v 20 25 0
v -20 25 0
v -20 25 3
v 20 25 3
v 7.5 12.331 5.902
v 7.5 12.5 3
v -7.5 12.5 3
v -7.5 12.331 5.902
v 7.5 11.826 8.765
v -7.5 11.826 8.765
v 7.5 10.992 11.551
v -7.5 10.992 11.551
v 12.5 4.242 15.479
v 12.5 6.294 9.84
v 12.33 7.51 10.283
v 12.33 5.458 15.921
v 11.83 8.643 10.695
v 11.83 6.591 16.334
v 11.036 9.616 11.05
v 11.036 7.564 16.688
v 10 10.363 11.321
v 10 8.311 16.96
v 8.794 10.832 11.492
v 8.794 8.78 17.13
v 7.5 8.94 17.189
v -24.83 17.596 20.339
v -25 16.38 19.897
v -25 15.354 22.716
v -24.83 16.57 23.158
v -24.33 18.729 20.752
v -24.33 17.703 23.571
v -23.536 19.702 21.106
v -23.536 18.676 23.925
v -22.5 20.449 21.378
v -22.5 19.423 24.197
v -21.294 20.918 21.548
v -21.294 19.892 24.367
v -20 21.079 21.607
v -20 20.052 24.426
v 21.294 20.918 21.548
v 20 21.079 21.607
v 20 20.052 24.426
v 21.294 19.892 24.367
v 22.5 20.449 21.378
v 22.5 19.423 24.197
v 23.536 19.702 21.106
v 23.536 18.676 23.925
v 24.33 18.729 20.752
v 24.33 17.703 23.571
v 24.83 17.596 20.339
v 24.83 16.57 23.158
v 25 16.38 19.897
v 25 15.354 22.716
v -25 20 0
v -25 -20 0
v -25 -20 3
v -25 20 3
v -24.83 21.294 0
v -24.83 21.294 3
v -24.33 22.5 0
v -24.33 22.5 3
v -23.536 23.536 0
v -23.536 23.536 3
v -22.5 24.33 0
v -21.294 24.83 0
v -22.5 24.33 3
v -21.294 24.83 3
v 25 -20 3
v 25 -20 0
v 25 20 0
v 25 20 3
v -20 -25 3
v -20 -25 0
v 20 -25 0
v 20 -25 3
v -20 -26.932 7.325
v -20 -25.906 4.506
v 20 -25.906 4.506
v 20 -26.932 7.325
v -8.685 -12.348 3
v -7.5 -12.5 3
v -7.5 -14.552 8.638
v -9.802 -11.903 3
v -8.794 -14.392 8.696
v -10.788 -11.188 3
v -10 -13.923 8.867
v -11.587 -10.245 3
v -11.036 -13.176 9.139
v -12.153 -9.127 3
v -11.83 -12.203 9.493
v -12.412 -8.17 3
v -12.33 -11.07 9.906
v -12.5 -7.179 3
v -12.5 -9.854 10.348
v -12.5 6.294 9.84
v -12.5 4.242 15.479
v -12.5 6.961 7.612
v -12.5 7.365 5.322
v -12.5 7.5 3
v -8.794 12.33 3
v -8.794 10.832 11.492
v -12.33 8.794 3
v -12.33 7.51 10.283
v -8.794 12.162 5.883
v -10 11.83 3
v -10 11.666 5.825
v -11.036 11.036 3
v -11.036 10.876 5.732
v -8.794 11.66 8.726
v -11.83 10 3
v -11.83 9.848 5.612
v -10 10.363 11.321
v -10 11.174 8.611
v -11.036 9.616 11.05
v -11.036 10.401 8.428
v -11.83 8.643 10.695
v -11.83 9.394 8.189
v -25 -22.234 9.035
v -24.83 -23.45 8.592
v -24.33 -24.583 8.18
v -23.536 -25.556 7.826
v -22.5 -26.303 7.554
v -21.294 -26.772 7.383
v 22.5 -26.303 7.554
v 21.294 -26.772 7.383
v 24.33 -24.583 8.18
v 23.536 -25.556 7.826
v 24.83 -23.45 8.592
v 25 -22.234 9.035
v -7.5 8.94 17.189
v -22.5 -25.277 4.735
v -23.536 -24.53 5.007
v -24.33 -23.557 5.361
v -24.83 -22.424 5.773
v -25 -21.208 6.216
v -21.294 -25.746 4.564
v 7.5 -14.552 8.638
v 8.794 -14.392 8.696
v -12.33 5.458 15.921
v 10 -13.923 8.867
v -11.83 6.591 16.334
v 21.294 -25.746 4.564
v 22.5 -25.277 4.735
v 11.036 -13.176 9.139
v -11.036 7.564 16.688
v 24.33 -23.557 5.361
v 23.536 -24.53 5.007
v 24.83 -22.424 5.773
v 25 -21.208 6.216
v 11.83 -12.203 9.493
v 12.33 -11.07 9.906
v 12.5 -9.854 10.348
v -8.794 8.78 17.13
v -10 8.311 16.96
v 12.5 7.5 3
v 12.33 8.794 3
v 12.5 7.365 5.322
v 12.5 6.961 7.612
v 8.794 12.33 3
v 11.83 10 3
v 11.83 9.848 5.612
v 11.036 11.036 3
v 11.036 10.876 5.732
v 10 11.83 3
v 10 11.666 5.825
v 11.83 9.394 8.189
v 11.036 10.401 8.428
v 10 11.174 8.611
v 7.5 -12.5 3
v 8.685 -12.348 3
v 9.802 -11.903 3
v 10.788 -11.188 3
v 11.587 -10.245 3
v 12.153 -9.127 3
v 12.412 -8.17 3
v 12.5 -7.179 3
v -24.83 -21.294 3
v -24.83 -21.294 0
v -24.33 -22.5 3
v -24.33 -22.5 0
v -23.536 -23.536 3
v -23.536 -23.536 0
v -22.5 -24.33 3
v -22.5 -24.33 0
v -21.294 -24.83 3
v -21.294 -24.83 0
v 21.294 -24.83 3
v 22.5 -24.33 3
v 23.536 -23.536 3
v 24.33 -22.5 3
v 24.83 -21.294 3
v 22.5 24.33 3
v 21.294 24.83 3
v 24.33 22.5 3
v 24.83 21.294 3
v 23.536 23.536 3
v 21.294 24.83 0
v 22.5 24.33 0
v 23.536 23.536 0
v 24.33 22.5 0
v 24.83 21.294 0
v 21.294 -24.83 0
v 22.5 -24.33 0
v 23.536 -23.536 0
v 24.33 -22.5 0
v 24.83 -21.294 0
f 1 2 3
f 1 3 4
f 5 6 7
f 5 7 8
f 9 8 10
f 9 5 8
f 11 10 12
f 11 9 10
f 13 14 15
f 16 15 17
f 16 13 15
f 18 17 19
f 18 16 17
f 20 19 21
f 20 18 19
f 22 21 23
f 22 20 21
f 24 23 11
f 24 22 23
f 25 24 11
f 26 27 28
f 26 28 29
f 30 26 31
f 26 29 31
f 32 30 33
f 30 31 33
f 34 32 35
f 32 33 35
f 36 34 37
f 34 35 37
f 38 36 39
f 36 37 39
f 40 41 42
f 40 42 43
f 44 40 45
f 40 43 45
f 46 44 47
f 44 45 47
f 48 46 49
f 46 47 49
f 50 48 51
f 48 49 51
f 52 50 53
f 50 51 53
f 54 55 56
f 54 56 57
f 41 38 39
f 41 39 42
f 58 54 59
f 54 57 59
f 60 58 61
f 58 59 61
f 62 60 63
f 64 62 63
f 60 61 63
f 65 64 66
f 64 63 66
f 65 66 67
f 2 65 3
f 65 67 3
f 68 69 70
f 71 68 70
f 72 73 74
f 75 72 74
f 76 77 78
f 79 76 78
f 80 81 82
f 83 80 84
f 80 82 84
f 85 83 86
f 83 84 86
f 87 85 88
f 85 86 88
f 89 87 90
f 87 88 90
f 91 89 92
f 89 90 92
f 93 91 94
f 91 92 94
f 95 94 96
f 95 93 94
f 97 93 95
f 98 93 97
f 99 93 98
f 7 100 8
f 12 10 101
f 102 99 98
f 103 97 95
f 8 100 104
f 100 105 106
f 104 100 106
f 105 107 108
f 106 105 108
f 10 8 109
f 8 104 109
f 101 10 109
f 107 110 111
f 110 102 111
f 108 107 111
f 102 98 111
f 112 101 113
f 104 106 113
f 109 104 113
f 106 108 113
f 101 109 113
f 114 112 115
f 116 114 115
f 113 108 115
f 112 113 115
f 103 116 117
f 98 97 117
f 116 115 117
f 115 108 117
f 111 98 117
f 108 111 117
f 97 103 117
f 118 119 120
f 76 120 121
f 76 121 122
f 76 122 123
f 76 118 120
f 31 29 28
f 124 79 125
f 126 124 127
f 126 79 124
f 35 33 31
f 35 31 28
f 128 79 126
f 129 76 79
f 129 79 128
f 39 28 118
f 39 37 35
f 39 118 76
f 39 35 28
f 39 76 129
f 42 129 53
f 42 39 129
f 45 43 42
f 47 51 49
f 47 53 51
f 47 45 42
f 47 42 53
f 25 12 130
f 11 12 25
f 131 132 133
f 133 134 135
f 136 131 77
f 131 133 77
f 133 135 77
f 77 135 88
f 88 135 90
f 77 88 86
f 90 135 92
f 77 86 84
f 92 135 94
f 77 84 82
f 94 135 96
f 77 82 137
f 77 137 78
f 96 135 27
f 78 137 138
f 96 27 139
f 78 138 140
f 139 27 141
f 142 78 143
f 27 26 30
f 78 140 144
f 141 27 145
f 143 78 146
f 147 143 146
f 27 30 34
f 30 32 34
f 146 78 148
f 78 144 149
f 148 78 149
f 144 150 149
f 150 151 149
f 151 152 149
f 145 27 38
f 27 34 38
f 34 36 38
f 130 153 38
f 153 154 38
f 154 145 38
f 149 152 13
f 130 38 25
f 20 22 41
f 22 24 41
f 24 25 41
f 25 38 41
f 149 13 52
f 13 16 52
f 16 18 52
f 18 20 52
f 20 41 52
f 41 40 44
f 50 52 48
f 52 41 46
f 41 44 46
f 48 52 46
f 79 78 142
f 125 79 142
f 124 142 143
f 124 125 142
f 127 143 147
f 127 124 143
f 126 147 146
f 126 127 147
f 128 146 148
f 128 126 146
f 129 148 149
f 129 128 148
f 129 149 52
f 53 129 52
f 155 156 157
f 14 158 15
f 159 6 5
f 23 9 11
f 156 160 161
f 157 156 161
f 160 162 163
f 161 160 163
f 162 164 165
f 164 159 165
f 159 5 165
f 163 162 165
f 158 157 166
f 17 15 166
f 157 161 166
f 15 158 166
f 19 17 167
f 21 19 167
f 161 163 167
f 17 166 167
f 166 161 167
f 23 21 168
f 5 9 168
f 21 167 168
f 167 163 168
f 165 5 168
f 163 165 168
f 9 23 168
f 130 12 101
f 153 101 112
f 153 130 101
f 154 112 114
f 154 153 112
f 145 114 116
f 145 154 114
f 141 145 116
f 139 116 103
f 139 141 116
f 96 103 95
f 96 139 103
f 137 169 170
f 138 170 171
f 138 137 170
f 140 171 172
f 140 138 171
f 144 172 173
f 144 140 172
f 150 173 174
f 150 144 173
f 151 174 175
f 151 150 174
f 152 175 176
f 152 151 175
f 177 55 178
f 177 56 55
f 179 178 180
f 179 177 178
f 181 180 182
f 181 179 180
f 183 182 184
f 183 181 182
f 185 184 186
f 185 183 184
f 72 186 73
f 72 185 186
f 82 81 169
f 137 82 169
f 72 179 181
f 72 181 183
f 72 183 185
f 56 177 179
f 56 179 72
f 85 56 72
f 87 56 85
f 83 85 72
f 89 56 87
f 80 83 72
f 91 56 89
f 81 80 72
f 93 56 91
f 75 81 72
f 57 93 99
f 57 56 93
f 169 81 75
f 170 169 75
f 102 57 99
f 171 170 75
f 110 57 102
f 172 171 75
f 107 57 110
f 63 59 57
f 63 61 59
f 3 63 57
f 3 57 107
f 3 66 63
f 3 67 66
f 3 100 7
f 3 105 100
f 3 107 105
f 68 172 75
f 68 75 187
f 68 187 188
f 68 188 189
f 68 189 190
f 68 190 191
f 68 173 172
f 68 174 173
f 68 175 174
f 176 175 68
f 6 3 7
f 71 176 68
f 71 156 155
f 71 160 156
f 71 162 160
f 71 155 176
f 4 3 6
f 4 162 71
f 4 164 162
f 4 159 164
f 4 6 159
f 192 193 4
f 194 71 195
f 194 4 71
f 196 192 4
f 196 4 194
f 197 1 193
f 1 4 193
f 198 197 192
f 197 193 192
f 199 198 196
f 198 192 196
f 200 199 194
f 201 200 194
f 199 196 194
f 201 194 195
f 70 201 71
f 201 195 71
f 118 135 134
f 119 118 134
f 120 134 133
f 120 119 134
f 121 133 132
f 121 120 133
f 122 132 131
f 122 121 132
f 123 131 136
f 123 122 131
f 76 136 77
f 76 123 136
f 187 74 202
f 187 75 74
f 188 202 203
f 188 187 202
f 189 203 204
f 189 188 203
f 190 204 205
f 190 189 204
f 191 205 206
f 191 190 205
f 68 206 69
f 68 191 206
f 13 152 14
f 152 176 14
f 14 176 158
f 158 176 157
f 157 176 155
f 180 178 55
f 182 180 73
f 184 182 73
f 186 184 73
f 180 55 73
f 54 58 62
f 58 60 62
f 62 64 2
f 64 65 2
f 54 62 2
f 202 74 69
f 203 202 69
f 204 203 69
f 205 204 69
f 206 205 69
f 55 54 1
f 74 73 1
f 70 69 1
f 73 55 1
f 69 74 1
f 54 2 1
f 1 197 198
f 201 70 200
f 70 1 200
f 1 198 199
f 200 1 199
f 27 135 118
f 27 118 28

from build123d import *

# Parameters (mm, degrees)
F0_W     = 50
F0_H     = 50
F1_DEPTH = 3
F2_W     = 25
F2_H     = 25
F3_ANGLE = 20
F4_DEPTH = 6
F5_W     = 50
F5_H     = 50
F6_DEPTH = 3
F7_R     = 5
F8_R     = 5


with BuildPart() as f1:
    # F0 (on Top) → F1 (new body)
    with BuildSketch(Plane.XY):
        Rectangle(F0_W, F0_H)
    extrude(amount=F1_DEPTH)

    # F2 (on face) → F3 (revolve)
    with BuildSketch(Plane.XY.offset(3)):
        Rectangle(F2_W, F2_H)
    revolve(axis=Axis((0, -12.5, 3), (1, 0, 0)), revolution_arc=F3_ANGLE)

    # F4 (add): a face of the model
    f4_faces = [f1.faces().sort_by_distance(p)[0] for p in [
        (0, -0.7538422402, 7.2752517916),
    ]]
    extrude(f4_faces, amount=F4_DEPTH)

    # F5 (on face) → F6 (join)
    with BuildSketch(Plane(origin=(0, -4.478524505, 12.3046449499), x_dir=(1, 0, 0), z_dir=(0, -0.3420201433, 0.9396926208))):
        with Locations((0, 2.1972288873)):
            Rectangle(F5_W, F5_H)
    extrude(amount=F6_DEPTH)

    # F7
    f7_edges = [f1.edges().sort_by_distance(p)[0] for p in [
        (25, 20.565481, 23.016184),
        (-25, 20.565481, 23.016184),
        (-25, -26.41915, 5.915177),
        (25, -26.41915, 5.915177),
        (25, -25, 1.5),
        (-25, -25, 1.5),
        (-25, 25, 1.5),
        (25, 25, 1.5),
    ]]
    fillet(f7_edges, radius=F7_R)

    # F8
    f8_edges = [f1.edges().sort_by_distance(p)[0] for p in [
        (12.5, 9.966255, 14.369581),
        (-12.5, 9.966255, 14.369581),
        (-12.5, -13.52606, 5.819078),
        (12.5, -13.52606, 5.819078),
    ]]
    fillet(f8_edges, radius=F8_R)


solid = f1.part
